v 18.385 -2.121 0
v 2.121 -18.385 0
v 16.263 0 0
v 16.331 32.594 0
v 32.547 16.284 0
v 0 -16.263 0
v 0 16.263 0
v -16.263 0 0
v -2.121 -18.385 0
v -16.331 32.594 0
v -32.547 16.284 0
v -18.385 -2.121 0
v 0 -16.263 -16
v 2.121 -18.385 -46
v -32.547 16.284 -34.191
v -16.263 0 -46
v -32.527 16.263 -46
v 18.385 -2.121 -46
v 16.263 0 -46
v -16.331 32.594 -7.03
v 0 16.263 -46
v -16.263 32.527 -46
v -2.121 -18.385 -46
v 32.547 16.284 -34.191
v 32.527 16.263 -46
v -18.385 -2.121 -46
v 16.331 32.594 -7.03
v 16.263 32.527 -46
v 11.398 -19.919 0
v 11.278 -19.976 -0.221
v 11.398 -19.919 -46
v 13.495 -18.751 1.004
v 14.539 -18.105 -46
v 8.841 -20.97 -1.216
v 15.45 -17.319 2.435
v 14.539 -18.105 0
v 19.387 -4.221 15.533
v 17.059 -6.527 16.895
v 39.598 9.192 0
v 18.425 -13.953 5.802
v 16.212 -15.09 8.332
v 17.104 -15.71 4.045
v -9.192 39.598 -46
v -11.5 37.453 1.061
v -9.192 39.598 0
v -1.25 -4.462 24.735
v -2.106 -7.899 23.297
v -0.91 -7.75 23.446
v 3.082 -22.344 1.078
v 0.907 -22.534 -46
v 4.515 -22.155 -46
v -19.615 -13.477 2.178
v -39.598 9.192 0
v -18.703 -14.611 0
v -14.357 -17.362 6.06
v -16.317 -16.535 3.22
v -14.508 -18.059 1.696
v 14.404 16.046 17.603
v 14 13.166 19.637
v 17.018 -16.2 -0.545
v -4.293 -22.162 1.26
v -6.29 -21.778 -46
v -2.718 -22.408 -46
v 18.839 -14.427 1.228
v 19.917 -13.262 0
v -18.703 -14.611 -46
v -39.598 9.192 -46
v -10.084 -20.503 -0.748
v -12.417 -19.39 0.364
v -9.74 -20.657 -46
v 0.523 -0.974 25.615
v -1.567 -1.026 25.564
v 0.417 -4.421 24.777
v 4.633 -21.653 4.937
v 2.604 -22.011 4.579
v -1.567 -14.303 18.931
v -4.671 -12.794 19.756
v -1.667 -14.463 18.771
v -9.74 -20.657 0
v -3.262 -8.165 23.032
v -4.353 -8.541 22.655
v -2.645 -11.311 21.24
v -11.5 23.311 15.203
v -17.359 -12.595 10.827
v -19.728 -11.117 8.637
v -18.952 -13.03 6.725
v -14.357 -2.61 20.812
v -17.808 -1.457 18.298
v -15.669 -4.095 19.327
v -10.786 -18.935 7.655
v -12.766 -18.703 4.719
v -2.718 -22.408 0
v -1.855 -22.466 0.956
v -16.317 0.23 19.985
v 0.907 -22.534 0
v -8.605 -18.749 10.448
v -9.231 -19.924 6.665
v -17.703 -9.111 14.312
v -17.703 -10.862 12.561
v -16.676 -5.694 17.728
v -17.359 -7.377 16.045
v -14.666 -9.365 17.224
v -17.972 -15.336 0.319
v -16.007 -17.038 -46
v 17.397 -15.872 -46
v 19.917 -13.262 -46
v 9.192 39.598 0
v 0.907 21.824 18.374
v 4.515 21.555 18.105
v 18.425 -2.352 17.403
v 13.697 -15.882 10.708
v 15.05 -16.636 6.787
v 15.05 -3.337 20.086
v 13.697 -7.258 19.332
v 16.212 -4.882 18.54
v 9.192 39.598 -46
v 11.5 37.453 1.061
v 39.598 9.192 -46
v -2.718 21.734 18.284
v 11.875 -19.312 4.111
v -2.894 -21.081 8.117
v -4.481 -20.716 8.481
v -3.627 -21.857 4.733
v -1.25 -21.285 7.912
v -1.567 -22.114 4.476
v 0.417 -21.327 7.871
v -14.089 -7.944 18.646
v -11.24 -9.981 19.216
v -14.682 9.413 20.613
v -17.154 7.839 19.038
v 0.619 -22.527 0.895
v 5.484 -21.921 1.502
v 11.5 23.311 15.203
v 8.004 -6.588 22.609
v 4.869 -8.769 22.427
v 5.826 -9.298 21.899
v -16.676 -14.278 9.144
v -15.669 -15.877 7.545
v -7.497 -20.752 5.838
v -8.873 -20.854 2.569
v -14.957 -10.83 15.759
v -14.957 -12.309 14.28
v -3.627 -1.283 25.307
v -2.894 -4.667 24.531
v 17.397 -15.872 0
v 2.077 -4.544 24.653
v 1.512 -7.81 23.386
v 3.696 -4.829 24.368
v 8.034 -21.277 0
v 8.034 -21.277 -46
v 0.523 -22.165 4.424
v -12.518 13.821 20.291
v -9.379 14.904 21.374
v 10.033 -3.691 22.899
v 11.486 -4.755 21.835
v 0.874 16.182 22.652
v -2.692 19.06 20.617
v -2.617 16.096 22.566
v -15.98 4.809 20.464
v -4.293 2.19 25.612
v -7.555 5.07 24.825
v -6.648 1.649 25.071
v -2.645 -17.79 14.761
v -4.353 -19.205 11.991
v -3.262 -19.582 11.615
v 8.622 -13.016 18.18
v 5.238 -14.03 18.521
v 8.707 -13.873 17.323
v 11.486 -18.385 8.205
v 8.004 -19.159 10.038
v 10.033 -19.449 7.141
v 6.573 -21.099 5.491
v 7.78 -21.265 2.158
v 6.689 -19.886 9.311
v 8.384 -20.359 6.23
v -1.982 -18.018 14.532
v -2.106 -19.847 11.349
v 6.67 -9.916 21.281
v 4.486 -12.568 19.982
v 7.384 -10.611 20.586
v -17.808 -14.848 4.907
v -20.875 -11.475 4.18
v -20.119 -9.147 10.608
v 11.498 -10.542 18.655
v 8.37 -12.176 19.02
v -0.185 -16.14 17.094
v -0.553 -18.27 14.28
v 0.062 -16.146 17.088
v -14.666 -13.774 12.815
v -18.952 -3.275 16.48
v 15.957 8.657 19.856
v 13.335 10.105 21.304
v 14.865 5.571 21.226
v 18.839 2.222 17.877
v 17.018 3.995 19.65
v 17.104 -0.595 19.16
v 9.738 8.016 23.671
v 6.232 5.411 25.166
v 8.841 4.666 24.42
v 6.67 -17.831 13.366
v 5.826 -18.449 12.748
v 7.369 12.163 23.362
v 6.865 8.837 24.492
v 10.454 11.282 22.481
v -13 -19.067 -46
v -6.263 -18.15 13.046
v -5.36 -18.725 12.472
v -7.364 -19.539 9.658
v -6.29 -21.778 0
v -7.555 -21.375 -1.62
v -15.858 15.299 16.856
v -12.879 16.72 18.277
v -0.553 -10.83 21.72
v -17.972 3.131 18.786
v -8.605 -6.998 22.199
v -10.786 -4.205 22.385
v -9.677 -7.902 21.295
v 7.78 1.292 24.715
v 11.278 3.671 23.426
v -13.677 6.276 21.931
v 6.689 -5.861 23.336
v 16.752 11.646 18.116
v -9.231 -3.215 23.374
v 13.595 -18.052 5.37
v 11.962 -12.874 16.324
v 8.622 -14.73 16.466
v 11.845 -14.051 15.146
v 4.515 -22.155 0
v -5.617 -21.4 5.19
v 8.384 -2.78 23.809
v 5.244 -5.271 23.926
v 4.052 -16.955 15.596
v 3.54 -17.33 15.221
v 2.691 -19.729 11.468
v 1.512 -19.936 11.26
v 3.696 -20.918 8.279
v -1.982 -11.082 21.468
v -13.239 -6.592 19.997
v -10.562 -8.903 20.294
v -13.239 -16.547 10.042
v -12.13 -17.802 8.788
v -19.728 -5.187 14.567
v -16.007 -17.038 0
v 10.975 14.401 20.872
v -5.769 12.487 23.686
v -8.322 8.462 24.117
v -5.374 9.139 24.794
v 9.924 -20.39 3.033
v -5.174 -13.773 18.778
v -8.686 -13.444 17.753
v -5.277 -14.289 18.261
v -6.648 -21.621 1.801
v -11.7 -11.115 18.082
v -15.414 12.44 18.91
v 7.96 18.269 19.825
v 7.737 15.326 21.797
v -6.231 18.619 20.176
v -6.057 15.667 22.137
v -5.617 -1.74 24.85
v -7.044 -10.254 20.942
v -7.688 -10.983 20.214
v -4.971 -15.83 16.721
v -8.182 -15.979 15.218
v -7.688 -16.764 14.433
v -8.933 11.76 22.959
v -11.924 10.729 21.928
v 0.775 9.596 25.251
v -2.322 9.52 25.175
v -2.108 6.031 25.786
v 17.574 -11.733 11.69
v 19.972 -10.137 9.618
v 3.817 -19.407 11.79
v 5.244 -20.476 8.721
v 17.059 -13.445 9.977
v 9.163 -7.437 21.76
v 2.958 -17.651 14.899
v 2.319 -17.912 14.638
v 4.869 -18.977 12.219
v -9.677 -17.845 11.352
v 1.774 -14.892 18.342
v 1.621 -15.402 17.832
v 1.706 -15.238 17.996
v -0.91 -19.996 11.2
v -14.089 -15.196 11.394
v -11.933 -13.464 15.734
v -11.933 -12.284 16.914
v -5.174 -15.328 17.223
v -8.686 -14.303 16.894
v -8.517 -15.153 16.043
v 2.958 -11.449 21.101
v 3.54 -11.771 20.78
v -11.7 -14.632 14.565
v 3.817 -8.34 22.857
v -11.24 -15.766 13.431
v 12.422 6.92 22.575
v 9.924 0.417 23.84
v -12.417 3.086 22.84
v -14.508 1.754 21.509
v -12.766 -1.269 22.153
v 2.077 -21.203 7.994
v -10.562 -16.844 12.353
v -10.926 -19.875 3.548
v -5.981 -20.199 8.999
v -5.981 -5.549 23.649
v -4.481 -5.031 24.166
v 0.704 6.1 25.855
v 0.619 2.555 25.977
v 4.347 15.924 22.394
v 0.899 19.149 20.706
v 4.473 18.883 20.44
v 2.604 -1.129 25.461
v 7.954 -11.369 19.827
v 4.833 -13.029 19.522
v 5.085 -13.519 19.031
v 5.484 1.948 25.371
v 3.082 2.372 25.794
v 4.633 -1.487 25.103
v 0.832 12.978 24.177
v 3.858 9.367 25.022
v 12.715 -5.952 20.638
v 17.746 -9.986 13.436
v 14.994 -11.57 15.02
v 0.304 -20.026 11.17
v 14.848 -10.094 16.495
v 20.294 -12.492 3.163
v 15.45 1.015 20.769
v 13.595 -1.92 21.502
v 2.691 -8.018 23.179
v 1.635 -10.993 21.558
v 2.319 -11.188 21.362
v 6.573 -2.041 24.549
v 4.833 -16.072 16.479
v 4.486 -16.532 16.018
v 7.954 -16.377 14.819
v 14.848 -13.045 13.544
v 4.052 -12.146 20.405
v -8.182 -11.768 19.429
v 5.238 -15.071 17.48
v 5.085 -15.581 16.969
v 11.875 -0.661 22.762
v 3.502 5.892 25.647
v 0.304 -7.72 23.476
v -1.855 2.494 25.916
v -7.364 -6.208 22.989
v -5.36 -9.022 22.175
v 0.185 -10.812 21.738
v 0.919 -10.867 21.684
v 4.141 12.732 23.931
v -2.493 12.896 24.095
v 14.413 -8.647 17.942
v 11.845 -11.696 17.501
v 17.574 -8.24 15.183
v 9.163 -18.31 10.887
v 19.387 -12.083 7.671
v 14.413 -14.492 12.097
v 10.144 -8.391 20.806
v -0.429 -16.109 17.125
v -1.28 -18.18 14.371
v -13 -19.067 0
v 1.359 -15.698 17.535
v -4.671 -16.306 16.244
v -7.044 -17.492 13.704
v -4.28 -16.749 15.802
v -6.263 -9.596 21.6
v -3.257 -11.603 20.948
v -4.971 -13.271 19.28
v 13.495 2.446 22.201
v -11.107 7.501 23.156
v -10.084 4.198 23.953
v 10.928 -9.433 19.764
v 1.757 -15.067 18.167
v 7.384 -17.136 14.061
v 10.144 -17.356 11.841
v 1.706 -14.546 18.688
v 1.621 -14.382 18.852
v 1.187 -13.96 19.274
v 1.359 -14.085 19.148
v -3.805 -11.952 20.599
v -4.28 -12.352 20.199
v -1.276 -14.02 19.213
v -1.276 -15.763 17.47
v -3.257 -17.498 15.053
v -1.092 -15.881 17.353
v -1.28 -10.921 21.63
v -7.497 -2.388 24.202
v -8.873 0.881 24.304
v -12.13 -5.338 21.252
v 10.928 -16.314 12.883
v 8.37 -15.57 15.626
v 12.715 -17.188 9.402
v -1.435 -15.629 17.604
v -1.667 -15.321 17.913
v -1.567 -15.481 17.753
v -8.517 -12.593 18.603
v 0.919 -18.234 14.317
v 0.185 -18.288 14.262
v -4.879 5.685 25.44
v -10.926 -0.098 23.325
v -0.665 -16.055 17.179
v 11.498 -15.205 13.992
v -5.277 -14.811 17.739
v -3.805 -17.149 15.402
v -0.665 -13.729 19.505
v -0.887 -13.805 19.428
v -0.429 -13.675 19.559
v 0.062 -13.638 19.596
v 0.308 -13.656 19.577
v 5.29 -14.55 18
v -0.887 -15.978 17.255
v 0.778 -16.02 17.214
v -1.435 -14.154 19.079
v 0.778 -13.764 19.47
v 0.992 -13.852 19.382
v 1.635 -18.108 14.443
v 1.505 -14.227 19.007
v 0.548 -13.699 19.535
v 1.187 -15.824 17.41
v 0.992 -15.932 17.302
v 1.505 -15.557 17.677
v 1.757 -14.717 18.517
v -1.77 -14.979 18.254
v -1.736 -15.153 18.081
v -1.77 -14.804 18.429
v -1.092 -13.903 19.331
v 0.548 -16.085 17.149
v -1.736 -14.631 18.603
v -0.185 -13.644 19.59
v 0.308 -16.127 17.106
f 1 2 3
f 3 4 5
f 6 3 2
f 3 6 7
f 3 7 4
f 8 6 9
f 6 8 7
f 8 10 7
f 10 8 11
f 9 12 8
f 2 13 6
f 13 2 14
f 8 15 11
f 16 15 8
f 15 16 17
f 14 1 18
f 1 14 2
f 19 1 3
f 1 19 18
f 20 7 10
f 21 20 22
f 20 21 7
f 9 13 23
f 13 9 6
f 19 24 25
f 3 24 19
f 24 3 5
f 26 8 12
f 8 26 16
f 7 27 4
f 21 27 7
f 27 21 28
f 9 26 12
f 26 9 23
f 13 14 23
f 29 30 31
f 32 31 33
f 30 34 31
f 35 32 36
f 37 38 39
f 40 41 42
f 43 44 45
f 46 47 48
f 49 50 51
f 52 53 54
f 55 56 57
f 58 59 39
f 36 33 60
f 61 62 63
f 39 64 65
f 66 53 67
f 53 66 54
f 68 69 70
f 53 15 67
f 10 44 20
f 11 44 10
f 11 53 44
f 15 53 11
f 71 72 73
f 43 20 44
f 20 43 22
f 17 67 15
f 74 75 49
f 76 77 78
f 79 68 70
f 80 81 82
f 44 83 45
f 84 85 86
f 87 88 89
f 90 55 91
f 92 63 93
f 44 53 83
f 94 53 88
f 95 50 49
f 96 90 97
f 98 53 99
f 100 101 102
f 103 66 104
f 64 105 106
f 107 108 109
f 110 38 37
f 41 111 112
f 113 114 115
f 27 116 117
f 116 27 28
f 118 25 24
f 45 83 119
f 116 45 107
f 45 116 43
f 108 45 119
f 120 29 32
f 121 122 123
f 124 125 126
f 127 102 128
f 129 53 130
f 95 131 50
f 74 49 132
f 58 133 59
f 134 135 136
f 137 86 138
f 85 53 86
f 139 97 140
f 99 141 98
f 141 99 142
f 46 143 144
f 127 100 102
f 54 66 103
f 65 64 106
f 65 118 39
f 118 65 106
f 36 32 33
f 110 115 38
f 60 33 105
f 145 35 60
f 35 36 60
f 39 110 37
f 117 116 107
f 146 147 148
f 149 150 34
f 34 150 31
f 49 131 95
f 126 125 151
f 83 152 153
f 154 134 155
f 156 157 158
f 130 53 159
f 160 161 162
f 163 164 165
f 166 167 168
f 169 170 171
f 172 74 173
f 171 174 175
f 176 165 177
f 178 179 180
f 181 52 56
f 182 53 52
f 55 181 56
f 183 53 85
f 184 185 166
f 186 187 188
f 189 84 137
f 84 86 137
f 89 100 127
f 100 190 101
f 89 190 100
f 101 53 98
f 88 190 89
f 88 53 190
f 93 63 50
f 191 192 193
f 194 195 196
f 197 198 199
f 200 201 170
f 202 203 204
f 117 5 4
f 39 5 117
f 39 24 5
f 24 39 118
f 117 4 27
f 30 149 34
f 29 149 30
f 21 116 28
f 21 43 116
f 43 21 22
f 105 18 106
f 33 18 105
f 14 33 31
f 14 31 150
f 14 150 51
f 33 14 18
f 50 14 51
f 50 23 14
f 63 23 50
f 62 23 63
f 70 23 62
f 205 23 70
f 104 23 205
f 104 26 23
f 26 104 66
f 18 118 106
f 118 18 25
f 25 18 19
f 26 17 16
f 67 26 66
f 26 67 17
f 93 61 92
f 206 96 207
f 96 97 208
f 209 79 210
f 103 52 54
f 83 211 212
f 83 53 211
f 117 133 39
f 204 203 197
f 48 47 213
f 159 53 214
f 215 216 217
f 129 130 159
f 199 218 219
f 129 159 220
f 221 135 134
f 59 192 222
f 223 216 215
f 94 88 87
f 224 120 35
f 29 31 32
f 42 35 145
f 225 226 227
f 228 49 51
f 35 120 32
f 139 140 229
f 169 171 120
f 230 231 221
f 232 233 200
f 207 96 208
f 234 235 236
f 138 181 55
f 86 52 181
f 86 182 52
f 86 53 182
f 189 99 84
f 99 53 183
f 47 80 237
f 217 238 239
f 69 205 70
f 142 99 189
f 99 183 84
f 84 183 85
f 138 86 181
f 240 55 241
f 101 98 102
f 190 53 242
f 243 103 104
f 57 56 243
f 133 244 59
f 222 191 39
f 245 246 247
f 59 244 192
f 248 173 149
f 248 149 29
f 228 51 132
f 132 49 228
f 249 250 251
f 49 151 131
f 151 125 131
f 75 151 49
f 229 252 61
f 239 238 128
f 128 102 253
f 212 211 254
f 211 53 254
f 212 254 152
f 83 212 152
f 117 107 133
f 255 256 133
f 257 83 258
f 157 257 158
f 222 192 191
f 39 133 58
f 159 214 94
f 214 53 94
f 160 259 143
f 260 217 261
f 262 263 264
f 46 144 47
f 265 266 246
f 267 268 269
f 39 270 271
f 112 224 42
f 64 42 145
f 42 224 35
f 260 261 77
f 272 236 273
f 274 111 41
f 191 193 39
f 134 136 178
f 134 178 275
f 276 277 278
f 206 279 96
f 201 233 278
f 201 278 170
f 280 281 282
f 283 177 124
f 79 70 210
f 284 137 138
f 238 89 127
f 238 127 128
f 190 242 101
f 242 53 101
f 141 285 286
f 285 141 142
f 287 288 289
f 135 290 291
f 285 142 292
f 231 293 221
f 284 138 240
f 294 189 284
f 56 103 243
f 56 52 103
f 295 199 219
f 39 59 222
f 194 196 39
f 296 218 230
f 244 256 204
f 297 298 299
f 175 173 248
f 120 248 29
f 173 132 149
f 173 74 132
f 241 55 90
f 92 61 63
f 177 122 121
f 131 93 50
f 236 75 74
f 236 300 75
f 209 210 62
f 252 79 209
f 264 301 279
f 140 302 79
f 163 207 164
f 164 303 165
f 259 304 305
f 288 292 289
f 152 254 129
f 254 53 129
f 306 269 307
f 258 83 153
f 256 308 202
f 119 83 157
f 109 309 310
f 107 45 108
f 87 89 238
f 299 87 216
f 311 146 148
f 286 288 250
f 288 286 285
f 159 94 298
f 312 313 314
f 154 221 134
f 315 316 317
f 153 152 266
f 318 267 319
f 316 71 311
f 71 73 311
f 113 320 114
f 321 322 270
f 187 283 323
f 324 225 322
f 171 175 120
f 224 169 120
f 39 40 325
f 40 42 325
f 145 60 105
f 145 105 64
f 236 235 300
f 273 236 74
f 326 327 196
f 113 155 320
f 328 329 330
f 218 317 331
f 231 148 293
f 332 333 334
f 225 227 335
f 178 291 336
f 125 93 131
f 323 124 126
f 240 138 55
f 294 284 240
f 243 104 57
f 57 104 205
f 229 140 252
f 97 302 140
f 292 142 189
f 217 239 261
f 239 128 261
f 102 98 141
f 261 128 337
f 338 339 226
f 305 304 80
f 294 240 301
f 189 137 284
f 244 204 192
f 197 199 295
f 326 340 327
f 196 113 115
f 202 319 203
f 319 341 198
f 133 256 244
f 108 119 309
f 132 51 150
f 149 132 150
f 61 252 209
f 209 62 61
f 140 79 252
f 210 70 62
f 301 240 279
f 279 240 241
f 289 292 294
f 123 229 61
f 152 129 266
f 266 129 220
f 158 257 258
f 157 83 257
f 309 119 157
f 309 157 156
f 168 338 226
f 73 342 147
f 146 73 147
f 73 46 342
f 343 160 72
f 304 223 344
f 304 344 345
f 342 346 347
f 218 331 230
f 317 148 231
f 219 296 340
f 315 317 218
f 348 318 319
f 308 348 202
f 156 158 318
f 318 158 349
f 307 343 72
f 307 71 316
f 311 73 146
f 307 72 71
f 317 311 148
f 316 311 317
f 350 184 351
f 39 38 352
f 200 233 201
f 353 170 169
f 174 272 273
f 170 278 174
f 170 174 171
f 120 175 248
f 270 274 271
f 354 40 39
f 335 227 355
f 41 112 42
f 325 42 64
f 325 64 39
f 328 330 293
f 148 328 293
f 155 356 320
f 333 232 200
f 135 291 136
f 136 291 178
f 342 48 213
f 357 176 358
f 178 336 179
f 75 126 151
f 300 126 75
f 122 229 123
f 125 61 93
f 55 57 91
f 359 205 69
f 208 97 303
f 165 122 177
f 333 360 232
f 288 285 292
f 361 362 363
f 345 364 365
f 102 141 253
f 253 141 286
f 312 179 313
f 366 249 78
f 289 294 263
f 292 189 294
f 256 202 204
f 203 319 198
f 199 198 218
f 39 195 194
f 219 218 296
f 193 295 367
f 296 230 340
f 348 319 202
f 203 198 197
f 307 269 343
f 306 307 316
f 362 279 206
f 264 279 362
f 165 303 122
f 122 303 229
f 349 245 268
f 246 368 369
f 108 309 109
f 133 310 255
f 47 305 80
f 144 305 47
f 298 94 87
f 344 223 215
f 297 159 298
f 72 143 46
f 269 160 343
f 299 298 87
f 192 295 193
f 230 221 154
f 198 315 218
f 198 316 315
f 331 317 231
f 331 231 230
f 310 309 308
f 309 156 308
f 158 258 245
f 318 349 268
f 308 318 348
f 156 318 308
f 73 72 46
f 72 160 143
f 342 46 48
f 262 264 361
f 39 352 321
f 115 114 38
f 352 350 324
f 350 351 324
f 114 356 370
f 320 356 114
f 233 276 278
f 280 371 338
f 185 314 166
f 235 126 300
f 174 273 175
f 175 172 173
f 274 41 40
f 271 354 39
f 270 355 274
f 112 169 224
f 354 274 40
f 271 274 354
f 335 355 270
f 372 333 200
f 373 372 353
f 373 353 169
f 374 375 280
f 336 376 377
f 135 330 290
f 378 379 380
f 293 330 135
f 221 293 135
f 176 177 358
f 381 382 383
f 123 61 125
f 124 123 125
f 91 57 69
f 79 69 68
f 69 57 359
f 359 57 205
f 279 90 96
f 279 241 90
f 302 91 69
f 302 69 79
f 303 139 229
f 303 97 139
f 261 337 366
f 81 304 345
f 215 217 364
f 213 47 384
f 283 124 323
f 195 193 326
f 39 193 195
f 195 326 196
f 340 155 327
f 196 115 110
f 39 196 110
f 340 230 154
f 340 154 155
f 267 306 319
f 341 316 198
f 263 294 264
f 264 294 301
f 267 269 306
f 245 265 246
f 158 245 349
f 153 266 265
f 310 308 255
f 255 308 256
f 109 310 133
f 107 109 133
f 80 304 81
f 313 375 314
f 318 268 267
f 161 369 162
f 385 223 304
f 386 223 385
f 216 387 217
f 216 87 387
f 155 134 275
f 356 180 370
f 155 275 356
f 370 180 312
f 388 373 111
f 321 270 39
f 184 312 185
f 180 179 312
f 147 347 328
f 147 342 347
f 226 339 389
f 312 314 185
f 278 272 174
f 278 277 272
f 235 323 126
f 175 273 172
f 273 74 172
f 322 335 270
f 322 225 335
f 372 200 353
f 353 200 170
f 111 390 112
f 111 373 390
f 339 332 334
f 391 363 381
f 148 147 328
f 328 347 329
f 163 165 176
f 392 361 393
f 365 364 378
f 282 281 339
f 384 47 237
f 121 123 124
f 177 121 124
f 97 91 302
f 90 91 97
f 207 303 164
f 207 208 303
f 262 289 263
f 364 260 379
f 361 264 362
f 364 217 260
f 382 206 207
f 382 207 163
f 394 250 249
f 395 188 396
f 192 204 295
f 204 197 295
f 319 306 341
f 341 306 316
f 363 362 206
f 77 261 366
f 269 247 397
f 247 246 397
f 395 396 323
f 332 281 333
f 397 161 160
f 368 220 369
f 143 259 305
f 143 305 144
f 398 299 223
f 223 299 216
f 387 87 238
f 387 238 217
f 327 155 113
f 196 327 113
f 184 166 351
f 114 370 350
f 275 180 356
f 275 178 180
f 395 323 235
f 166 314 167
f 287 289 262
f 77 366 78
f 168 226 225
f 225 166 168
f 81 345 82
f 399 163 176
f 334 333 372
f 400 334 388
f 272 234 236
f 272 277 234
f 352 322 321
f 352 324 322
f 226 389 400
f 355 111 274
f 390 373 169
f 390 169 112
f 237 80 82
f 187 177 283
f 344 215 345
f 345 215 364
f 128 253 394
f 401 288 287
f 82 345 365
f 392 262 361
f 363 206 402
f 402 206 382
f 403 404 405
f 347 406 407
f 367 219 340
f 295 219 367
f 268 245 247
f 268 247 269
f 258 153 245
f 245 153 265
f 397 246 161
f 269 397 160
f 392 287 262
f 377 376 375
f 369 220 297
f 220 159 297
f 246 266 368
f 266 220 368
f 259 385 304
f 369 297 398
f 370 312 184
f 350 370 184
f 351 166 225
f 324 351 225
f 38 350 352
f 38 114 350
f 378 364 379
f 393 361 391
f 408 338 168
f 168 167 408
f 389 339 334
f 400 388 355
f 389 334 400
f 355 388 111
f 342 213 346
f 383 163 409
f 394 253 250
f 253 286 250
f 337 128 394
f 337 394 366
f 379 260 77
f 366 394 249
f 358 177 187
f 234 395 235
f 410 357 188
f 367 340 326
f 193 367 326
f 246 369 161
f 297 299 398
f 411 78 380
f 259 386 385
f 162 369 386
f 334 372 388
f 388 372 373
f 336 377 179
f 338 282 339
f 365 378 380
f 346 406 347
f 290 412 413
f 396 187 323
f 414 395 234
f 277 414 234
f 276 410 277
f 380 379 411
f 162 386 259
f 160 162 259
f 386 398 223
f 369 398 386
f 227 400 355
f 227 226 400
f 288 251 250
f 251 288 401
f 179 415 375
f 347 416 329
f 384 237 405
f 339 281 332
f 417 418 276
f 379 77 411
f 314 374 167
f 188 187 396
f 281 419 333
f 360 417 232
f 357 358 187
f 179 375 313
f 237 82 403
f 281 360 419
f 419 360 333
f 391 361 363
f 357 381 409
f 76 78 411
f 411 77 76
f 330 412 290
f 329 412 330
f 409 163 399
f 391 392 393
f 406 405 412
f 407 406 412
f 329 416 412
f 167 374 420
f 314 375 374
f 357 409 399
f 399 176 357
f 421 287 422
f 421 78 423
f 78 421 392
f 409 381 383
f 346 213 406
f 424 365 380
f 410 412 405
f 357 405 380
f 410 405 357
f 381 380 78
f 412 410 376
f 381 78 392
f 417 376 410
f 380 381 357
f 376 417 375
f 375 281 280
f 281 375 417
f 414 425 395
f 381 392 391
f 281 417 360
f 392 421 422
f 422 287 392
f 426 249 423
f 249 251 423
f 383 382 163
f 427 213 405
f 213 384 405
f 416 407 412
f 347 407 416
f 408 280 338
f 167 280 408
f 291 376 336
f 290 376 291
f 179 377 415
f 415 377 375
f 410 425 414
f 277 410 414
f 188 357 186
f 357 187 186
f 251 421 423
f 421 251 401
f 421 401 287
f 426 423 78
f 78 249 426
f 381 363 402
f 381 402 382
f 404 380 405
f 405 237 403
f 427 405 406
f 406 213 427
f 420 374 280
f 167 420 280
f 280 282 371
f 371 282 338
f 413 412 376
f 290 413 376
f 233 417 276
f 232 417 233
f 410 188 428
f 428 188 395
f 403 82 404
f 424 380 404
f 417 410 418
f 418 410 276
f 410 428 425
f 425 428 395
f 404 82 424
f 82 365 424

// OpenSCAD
left = -1;
right = 1;

board_thickness = 23;
board_offset    = 3;
guard_diam      = 36;
inner_wall      = 10;
side_thickness  = 23;
side_length     = 50;
side_height     = 50;

resolution = 18*2.5;

module board() {
  translate([0,25,-25])
    cube([side_thickness,side_length,side_height],center=true);
}

module guard() {
  module body() {
    hull() {
      translate([0,board_thickness*.15,0]) {
        rotate([45,0,0])
          sphere(r=26,$fn=resolution);

        translate([0,0,-side_thickness])
          cylinder(r=26,h=side_thickness*2,center=true,$fn=resolution);
      }

      for (side = [left, right]) {
        rotate([0,0,45*side])
          translate([0,10+side_thickness-board_thickness/2-inner_wall/2,-side_thickness])
            cube([board_thickness+inner_wall*2,side_thickness*2+inner_wall-20,side_thickness*2],center=true);
      }

      translate([0,board_thickness*.75+inner_wall*.5,0])
          rotate([45,0,0])
            cube([side_thickness,side_thickness,20],center=true);
    }
  }

  module holes() {
    // bed boards
    for (side = [left,right]) {
      rotate([0,0,-45*side])
        translate([0,25-board_thickness/2-3,-side_height/2]) {
          cube([side_thickness,side_length,side_height],center=true);
        }
    }

    hull() {
      for (side = [left,right]) {
        rotate([0,0,-45*side])
          translate([0,-9.5,-side_height])
            cube([side_thickness,10,8],center=true);
      }

      rotate([0,0,45])
        translate([-side_thickness/2+4,-side_thickness/2+4,-side_height+30])
          cube([8,8,8],center=true);
    }
  }

  difference() {
    body();
    holes();
  }
}
guard();

module printable_opening_down() {
  difference() {
    translate([0,0,31])
      rotate([-45,0,0])
          guard();
    translate([0,0,-50])
      cube([100,100,100],center=true);
  }
}
//printable_opening_down();
